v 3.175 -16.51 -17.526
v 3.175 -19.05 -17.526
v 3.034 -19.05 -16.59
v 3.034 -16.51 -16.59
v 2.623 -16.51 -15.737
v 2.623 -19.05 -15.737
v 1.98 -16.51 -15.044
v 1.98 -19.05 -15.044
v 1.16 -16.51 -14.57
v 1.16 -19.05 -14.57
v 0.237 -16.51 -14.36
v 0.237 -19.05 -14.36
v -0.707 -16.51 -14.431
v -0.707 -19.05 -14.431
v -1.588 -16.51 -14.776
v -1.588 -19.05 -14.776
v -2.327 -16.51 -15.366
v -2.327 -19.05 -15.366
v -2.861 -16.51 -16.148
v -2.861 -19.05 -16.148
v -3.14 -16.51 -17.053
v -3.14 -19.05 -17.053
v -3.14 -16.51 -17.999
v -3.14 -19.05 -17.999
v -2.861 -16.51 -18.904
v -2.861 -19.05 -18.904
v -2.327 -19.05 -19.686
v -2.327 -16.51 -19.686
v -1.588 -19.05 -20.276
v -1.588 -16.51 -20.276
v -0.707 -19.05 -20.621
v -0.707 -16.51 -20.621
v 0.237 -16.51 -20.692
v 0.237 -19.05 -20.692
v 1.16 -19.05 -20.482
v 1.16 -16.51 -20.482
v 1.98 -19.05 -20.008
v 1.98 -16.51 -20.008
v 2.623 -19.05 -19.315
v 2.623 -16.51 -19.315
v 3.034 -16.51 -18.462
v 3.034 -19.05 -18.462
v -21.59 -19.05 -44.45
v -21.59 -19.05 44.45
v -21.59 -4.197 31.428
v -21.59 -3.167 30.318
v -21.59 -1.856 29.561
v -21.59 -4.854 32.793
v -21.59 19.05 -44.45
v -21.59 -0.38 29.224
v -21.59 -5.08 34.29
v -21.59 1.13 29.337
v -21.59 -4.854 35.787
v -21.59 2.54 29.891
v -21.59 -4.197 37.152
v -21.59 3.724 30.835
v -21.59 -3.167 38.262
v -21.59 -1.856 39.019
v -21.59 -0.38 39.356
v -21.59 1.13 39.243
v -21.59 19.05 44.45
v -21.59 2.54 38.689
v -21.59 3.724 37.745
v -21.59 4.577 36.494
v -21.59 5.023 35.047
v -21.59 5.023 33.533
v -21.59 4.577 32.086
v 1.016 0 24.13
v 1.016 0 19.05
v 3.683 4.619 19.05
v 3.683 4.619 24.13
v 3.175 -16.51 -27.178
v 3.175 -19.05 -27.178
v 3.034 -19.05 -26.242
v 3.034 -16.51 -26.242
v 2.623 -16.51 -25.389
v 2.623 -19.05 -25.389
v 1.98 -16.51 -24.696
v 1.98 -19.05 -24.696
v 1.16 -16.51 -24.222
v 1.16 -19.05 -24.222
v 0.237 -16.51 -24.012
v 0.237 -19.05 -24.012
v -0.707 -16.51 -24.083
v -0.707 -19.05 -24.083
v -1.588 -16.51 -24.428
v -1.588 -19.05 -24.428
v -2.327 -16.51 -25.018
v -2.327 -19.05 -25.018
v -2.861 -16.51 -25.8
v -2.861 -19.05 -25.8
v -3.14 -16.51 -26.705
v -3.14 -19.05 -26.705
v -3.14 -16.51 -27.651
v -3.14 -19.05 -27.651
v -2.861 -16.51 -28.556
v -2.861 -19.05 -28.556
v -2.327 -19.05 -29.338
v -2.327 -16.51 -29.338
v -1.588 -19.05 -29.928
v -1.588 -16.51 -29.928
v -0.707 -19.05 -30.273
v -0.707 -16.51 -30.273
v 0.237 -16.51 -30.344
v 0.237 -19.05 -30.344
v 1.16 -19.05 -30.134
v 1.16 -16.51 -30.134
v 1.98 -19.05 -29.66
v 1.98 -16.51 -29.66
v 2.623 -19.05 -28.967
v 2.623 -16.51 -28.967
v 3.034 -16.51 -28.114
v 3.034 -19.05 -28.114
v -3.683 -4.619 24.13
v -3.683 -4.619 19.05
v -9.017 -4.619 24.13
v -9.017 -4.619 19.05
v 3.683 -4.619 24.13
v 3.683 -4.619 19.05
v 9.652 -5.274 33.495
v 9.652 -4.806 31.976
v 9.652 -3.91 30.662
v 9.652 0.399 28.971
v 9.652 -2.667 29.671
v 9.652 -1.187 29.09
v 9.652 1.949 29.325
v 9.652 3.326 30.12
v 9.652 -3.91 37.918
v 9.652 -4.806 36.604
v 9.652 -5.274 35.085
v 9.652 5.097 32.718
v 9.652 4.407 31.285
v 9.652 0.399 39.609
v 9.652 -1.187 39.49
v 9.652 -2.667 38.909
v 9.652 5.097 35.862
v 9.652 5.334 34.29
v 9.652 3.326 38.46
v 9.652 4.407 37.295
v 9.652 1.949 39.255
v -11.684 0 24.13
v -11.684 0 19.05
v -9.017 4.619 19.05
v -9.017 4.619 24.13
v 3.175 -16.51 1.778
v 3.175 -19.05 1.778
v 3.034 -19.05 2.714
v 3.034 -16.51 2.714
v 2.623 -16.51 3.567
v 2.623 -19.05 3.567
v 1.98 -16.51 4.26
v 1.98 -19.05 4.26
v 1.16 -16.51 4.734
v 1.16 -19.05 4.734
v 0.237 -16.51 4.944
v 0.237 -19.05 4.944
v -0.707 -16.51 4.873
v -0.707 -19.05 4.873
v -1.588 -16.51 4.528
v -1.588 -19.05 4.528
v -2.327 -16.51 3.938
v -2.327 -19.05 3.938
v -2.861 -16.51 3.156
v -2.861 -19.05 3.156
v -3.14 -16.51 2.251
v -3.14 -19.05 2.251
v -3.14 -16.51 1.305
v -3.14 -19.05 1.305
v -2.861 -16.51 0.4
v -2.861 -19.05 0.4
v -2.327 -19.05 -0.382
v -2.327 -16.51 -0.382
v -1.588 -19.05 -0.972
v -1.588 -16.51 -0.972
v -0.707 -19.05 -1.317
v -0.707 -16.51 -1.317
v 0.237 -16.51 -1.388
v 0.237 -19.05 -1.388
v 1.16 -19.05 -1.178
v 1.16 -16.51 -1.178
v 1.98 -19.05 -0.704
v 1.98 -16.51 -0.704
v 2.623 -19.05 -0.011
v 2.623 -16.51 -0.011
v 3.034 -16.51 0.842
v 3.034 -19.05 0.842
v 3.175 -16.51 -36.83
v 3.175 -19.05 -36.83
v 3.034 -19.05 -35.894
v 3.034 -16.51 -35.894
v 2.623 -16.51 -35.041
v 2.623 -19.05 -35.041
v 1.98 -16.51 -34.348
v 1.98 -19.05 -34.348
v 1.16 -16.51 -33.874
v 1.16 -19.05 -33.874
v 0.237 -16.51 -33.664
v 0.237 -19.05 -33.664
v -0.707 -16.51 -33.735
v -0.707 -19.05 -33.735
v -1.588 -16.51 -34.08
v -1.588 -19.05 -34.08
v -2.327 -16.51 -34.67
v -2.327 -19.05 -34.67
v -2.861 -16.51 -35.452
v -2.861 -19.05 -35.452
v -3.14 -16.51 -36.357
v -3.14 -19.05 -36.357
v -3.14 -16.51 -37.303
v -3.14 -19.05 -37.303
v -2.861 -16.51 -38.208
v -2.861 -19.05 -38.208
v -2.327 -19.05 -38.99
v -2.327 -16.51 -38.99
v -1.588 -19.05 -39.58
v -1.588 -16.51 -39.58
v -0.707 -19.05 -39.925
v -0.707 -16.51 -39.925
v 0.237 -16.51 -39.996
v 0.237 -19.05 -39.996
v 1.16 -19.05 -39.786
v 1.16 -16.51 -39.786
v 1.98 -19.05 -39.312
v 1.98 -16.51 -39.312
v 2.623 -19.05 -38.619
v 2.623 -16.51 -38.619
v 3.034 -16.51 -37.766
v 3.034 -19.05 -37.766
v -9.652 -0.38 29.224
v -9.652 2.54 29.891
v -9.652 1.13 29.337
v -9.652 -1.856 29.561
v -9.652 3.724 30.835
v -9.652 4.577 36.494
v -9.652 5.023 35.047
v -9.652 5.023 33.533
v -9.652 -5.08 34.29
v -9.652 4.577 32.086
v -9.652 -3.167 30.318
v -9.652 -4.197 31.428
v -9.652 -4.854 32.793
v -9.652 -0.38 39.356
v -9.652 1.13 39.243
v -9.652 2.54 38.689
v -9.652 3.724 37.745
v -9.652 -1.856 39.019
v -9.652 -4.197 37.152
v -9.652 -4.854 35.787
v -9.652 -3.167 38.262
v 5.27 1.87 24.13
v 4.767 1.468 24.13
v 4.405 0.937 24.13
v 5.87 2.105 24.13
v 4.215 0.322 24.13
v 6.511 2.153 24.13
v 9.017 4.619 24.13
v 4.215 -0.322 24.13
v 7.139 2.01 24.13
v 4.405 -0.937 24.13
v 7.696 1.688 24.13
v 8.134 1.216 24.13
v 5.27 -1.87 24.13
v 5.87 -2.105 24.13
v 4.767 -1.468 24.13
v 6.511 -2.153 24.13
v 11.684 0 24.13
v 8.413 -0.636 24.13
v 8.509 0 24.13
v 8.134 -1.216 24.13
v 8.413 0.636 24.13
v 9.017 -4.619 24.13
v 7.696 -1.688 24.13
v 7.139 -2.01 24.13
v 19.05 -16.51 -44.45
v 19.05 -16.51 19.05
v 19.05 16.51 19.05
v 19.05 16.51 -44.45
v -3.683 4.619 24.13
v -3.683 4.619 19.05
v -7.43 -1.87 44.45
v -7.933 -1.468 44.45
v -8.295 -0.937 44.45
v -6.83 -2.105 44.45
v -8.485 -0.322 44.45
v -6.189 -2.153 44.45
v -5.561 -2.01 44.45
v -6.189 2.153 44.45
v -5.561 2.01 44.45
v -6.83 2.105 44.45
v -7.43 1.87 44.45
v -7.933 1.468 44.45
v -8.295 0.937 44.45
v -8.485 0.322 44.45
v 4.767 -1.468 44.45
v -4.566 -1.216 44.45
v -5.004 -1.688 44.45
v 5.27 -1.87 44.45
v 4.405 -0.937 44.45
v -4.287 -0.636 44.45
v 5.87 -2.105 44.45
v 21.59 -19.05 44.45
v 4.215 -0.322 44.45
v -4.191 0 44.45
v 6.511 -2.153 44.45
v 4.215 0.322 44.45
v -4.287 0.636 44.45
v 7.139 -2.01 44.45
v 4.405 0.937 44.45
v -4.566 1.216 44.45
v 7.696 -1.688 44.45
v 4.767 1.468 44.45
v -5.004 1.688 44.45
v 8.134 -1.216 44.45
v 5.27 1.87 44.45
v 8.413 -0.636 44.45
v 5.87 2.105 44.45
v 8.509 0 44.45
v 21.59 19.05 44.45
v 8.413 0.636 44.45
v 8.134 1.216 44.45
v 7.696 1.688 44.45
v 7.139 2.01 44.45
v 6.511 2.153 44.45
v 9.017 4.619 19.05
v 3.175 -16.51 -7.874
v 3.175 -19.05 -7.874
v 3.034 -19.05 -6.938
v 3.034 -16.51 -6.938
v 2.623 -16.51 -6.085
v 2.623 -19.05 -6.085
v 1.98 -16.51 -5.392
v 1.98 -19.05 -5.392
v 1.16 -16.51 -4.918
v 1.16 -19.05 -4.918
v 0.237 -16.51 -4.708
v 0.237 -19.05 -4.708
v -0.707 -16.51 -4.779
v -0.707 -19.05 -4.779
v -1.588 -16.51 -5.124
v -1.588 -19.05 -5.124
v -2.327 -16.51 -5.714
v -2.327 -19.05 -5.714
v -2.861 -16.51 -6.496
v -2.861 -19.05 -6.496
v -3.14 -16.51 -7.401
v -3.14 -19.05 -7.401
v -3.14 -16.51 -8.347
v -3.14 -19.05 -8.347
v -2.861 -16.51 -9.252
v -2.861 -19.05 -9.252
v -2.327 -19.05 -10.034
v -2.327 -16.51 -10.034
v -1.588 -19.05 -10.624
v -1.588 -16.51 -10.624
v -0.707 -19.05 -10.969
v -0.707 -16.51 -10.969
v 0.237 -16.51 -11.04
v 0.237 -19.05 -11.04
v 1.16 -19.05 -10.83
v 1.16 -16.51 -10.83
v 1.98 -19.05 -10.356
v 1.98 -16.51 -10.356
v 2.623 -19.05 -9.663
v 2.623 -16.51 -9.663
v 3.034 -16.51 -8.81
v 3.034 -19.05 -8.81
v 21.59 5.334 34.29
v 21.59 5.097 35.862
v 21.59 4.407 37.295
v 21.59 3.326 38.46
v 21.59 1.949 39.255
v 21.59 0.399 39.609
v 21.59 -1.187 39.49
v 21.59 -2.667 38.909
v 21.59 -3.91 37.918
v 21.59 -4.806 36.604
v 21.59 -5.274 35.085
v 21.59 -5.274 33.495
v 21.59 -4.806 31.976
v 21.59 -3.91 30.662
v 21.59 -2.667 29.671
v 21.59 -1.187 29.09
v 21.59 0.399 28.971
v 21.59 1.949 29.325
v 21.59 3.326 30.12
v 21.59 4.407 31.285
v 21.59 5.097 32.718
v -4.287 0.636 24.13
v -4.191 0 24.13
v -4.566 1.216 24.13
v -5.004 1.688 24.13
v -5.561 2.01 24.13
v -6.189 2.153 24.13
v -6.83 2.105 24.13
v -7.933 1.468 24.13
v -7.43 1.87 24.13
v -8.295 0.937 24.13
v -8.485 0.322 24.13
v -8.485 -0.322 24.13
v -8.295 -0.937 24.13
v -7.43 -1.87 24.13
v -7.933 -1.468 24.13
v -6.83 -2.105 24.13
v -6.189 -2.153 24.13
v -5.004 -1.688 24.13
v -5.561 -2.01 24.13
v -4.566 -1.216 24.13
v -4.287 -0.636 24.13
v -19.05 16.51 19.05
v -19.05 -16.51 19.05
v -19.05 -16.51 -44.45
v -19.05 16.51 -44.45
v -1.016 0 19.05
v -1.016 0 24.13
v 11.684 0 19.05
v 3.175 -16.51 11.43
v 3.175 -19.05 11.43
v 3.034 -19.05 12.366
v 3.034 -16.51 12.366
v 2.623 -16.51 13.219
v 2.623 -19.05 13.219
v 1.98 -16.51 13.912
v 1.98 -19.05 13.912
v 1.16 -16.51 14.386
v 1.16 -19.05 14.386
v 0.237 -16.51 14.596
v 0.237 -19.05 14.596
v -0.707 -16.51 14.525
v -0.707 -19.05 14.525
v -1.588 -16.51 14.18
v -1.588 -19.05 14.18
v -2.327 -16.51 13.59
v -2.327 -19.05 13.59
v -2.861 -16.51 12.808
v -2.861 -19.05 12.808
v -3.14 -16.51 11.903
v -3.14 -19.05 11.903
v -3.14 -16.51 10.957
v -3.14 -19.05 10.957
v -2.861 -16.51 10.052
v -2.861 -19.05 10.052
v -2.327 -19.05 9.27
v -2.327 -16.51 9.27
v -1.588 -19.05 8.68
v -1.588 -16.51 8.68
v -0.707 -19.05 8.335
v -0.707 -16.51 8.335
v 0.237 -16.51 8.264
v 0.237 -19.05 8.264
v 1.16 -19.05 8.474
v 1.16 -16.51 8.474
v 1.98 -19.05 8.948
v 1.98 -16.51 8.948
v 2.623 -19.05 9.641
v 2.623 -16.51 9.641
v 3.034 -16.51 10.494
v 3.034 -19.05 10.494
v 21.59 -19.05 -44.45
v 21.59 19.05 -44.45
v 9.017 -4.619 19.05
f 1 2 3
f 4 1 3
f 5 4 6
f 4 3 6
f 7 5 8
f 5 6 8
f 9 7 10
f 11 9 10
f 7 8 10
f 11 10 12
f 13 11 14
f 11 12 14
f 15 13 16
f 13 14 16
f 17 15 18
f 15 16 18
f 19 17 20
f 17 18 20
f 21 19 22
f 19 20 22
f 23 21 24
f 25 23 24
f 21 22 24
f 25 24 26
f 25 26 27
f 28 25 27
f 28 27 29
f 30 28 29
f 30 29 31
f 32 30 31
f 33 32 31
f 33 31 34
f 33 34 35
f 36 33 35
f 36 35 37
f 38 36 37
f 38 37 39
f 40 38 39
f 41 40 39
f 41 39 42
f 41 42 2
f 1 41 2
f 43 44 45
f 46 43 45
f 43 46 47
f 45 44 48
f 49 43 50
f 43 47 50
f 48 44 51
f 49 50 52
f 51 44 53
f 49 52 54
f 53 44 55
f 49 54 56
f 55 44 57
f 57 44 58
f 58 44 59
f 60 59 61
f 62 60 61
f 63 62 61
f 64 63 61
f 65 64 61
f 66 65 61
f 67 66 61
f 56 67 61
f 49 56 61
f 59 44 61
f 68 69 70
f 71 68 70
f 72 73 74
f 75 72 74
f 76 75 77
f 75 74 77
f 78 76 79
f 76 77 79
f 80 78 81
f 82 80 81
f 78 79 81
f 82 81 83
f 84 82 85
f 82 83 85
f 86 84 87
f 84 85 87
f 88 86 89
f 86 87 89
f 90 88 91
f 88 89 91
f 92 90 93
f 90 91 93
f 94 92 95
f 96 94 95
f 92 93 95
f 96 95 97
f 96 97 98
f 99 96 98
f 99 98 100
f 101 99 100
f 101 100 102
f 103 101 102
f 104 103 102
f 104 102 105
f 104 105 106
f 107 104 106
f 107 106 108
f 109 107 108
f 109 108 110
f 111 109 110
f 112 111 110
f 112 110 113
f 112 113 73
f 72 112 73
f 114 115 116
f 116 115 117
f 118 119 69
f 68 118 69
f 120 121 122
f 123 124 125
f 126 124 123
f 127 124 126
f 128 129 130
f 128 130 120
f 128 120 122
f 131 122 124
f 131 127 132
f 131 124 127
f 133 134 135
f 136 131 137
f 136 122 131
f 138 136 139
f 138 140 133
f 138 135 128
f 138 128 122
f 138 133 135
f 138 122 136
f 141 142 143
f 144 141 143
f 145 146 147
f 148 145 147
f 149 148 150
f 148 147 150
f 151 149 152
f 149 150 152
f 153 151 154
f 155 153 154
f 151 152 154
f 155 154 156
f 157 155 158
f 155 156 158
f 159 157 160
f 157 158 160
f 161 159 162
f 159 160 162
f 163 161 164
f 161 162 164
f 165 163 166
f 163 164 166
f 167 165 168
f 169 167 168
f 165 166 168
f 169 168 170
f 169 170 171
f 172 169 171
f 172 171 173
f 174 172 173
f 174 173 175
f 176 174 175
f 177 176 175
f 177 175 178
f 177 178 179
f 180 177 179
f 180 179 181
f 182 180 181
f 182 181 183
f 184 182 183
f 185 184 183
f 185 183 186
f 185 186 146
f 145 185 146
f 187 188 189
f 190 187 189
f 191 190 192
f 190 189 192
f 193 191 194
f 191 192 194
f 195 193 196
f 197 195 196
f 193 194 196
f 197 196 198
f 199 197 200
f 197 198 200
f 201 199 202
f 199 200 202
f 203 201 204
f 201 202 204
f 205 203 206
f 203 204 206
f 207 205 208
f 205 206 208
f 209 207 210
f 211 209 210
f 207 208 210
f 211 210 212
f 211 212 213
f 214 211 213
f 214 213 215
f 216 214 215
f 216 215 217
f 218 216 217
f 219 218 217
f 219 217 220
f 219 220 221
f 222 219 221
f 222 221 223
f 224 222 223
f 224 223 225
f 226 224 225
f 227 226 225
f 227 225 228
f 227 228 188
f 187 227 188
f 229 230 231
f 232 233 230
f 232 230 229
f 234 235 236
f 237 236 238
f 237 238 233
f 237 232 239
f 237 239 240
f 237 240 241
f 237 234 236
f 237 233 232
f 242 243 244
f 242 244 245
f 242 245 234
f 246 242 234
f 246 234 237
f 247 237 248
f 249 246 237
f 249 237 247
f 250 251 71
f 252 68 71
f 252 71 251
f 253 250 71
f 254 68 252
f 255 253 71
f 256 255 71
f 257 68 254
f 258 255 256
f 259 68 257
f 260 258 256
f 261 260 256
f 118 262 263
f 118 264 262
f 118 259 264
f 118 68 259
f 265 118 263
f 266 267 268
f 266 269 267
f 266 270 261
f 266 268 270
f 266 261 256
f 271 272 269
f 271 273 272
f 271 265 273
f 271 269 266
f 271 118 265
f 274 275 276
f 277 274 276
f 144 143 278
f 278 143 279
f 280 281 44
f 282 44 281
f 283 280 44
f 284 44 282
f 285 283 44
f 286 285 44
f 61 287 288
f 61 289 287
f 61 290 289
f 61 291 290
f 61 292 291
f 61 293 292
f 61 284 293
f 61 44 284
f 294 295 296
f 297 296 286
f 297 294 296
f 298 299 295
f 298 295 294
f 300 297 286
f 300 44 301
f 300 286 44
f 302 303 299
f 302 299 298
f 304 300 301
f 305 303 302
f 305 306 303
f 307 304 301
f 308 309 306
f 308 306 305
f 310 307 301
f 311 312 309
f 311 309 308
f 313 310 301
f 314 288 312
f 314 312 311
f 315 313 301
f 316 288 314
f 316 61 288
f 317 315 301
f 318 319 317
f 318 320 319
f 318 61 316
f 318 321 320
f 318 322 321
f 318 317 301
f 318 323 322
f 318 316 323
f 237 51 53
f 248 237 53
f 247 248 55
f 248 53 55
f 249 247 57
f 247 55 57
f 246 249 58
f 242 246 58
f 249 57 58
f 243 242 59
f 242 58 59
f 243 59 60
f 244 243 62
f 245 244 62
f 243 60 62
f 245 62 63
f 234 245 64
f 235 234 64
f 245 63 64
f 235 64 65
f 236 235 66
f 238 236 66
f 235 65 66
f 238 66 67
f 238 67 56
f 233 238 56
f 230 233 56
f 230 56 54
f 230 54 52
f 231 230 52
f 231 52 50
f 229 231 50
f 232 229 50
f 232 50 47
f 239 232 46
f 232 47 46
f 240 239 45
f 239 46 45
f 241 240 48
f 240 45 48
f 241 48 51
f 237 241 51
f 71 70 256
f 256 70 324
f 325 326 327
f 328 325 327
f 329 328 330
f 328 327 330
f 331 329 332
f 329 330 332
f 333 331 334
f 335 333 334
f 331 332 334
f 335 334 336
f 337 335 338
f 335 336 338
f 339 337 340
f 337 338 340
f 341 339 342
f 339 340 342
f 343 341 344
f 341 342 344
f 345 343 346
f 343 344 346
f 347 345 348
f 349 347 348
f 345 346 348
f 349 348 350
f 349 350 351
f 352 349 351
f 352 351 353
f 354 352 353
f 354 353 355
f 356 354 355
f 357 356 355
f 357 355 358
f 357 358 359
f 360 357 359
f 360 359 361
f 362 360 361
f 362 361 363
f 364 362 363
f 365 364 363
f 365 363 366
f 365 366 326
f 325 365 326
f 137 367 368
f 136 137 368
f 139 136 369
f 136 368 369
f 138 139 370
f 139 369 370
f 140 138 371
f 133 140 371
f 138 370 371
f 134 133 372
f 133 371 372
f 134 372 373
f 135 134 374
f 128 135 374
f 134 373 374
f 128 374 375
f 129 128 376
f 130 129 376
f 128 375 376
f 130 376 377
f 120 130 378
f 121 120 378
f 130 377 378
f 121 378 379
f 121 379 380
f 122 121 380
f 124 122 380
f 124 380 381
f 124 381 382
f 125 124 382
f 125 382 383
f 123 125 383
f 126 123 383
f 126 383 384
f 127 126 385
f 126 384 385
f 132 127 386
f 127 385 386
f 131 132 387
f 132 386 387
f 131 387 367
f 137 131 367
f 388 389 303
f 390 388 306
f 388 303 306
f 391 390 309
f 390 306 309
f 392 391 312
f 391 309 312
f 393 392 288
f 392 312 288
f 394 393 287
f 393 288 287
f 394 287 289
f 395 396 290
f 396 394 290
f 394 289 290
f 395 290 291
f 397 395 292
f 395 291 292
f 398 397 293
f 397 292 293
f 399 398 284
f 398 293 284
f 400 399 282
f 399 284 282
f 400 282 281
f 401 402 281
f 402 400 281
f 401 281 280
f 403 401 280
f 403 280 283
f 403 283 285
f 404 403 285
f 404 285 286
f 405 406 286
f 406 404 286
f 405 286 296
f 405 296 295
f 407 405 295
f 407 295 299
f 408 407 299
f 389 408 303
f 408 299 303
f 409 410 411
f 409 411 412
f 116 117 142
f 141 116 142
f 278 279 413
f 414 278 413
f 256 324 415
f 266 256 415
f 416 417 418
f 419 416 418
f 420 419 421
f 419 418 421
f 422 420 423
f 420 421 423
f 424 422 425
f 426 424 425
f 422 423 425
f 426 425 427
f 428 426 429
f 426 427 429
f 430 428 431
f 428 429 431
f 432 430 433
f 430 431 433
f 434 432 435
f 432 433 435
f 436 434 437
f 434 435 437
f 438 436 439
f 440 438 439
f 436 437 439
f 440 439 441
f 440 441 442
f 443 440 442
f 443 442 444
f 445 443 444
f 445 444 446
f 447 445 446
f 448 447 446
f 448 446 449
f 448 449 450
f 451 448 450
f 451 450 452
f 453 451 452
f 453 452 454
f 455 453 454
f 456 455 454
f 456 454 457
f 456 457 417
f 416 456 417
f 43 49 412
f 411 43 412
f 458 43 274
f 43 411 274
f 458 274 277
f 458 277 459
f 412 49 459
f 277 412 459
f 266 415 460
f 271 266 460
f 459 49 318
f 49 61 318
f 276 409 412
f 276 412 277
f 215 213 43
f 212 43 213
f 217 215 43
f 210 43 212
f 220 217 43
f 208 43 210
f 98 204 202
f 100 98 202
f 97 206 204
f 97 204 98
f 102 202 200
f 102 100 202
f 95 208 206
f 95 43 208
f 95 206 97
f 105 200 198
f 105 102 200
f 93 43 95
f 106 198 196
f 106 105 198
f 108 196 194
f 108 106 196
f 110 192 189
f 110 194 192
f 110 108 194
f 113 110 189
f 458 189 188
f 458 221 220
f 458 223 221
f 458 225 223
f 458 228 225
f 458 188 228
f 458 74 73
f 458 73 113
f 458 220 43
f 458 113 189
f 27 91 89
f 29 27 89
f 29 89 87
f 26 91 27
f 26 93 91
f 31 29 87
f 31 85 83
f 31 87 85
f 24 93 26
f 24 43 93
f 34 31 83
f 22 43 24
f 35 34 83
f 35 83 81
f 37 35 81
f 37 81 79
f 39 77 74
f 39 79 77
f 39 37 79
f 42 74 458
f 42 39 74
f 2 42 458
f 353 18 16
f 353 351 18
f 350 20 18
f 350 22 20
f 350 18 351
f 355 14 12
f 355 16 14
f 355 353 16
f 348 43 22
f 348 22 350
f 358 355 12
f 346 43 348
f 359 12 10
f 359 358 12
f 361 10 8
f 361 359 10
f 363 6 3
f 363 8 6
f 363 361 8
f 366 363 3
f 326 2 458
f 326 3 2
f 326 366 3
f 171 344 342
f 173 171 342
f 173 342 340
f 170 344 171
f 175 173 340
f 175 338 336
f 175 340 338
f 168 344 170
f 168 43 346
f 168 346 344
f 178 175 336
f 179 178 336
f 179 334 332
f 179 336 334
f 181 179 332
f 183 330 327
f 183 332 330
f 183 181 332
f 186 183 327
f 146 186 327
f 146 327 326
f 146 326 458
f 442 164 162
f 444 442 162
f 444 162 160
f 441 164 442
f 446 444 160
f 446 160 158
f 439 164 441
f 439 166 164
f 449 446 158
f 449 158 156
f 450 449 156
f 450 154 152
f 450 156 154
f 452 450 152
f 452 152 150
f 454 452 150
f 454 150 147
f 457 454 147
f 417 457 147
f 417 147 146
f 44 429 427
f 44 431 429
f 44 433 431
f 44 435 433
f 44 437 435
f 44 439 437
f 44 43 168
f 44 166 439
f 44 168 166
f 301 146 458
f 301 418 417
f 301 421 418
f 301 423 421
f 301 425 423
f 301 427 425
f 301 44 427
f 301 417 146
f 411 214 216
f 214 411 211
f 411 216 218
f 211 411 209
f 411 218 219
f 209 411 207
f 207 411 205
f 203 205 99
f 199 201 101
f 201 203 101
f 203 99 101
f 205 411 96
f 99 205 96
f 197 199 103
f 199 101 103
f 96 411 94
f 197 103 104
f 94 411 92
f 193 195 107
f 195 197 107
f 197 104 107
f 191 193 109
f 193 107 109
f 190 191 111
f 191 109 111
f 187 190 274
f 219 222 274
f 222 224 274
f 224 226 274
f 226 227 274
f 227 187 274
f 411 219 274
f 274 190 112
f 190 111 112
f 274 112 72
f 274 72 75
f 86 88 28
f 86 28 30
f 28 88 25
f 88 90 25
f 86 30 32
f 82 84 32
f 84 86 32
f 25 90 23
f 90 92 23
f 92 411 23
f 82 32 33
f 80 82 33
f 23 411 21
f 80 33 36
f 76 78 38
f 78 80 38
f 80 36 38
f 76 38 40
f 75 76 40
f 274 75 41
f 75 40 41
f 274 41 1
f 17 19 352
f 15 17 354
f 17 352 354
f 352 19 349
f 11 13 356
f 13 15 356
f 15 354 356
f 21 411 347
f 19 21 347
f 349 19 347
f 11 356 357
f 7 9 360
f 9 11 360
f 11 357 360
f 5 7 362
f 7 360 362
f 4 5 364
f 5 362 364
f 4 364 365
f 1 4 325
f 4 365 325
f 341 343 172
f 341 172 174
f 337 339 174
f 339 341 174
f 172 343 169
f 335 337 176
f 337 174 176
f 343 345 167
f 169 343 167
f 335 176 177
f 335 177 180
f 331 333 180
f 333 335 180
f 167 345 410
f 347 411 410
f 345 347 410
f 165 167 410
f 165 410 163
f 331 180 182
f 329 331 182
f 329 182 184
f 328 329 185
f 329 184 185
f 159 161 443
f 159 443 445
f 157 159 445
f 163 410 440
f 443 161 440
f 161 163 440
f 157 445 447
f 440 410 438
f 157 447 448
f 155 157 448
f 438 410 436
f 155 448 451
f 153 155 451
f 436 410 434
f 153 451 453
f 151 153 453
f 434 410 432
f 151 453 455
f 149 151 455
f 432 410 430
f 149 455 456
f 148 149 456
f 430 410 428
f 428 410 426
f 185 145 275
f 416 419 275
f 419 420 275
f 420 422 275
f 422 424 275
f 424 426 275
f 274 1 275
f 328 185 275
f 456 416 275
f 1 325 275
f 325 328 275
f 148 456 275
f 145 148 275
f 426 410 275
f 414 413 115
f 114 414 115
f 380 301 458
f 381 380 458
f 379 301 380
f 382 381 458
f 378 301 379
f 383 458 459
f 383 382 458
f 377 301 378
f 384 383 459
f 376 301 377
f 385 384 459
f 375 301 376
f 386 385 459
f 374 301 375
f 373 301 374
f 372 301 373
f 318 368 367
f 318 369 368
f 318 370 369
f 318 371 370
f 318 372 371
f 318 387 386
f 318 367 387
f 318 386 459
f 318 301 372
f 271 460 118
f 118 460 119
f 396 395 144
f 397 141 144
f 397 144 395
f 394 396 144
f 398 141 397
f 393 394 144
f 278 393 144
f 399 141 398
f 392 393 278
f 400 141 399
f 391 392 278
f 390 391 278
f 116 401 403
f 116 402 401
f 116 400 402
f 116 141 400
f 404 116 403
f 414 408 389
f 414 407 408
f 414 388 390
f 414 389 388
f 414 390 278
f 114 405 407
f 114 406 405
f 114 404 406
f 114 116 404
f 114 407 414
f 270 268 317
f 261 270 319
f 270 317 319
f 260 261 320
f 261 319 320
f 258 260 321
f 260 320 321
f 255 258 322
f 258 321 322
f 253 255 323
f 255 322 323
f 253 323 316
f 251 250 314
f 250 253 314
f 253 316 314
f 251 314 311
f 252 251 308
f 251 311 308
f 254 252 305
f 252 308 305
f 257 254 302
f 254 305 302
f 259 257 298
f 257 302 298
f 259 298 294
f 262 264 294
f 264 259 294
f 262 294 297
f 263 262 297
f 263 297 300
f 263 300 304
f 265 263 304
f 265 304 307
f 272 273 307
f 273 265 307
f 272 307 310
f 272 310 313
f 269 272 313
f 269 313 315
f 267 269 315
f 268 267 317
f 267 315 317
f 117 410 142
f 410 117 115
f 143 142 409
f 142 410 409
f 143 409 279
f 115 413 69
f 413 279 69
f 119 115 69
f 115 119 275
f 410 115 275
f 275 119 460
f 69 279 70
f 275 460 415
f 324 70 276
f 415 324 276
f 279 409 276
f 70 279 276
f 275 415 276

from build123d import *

# Parameters (mm, degrees)
F0_W      = 43.18
F0_H      = 38.1
F0_W_2    = 38.1
F0_H_2    = 33.02
F1_DEPTH  = 44.45
F2_W      = 38.1
F2_H      = 33.02
F2_R      = 2.159
F3_DEPTH  = 25.4
F4_R      = 2.159
F5_DEPTH  = 5.08
F6_R      = 3.175
F7_DEPTH  = 16.256
F8_R      = 5.08
F9_DEPTH  = 11.938
F10_R     = 5.334
F11_DEPTH = 11.938


with BuildPart() as f1:
    # F0 (on Top) → F1 (new body, symmetric)
    with BuildSketch(Plane.XY):
        Rectangle(F0_W, F0_H)
        Rectangle(F0_W_2, F0_H_2, mode=Mode.SUBTRACT)
    extrude(amount=F1_DEPTH, both=True)

    # F2 (on face) → F3 (join)
    with BuildSketch(Plane.XY.offset(44.45)):
        Rectangle(F2_W, F2_H)
        with Locations((-6.35, 0)):
            Circle(F2_R, mode=Mode.SUBTRACT)
        with Locations((6.35, 0)):
            Circle(F2_R, mode=Mode.SUBTRACT)
    extrude(amount=-F3_DEPTH)

    # F4 (on face) → F5 (cut)
    with BuildSketch(Plane(origin=(0, 0, 19.05), x_dir=(1, 0, 0), z_dir=(0, 0, -1))):
        Polygon((9.017, 4.6193795038), (3.683, 4.6193795038), (1.016, 0), (3.683, -4.6193795038), (9.017, -4.6193795038), (11.684, 0), align=None)
        with Locations((6.35, 0)):
            Circle(F4_R, mode=Mode.SUBTRACT)
        Polygon((-3.683, 4.6193795038), (-9.017, 4.6193795038), (-11.684, 0), (-9.017, -4.6193795038), (-3.683, -4.6193795038), (-1.016, 0), align=None)
        with Locations((-6.35, 0)):
            Circle(F4_R, mode=Mode.SUBTRACT)
    extrude(amount=-F5_DEPTH, mode=Mode.SUBTRACT)

    # F6 (on face) → F7 (cut)
    with BuildSketch(Plane.XZ.offset(19.05)):
        with Locations((0, 11.43)):
            Circle(F6_R)
        with Locations((0, 1.778)):
            Circle(F6_R)
        with Locations((0, -7.874)):
            Circle(F6_R)
        with Locations((0, -17.526)):
            Circle(F6_R)
        with Locations((0, -27.178)):
            Circle(F6_R)
        with Locations((0, -36.83)):
            Circle(F6_R)
    extrude(amount=-F7_DEPTH, mode=Mode.SUBTRACT)

    # F8 (on face) → F9 (cut)
    with BuildSketch(Plane(origin=(-21.59, 0, 0), x_dir=(0, -1, 0), z_dir=(-1, 0, 0))):
        with Locations((0, 34.29)):
            Circle(F8_R)
    extrude(amount=-F9_DEPTH, mode=Mode.SUBTRACT)

    # F10 (on face) → F11 (cut)
    with BuildSketch(Plane.YZ.offset(21.59)):
        with Locations((0, 34.29)):
            Circle(F10_R)
    extrude(amount=-F11_DEPTH, mode=Mode.SUBTRACT)


solid = f1.part
